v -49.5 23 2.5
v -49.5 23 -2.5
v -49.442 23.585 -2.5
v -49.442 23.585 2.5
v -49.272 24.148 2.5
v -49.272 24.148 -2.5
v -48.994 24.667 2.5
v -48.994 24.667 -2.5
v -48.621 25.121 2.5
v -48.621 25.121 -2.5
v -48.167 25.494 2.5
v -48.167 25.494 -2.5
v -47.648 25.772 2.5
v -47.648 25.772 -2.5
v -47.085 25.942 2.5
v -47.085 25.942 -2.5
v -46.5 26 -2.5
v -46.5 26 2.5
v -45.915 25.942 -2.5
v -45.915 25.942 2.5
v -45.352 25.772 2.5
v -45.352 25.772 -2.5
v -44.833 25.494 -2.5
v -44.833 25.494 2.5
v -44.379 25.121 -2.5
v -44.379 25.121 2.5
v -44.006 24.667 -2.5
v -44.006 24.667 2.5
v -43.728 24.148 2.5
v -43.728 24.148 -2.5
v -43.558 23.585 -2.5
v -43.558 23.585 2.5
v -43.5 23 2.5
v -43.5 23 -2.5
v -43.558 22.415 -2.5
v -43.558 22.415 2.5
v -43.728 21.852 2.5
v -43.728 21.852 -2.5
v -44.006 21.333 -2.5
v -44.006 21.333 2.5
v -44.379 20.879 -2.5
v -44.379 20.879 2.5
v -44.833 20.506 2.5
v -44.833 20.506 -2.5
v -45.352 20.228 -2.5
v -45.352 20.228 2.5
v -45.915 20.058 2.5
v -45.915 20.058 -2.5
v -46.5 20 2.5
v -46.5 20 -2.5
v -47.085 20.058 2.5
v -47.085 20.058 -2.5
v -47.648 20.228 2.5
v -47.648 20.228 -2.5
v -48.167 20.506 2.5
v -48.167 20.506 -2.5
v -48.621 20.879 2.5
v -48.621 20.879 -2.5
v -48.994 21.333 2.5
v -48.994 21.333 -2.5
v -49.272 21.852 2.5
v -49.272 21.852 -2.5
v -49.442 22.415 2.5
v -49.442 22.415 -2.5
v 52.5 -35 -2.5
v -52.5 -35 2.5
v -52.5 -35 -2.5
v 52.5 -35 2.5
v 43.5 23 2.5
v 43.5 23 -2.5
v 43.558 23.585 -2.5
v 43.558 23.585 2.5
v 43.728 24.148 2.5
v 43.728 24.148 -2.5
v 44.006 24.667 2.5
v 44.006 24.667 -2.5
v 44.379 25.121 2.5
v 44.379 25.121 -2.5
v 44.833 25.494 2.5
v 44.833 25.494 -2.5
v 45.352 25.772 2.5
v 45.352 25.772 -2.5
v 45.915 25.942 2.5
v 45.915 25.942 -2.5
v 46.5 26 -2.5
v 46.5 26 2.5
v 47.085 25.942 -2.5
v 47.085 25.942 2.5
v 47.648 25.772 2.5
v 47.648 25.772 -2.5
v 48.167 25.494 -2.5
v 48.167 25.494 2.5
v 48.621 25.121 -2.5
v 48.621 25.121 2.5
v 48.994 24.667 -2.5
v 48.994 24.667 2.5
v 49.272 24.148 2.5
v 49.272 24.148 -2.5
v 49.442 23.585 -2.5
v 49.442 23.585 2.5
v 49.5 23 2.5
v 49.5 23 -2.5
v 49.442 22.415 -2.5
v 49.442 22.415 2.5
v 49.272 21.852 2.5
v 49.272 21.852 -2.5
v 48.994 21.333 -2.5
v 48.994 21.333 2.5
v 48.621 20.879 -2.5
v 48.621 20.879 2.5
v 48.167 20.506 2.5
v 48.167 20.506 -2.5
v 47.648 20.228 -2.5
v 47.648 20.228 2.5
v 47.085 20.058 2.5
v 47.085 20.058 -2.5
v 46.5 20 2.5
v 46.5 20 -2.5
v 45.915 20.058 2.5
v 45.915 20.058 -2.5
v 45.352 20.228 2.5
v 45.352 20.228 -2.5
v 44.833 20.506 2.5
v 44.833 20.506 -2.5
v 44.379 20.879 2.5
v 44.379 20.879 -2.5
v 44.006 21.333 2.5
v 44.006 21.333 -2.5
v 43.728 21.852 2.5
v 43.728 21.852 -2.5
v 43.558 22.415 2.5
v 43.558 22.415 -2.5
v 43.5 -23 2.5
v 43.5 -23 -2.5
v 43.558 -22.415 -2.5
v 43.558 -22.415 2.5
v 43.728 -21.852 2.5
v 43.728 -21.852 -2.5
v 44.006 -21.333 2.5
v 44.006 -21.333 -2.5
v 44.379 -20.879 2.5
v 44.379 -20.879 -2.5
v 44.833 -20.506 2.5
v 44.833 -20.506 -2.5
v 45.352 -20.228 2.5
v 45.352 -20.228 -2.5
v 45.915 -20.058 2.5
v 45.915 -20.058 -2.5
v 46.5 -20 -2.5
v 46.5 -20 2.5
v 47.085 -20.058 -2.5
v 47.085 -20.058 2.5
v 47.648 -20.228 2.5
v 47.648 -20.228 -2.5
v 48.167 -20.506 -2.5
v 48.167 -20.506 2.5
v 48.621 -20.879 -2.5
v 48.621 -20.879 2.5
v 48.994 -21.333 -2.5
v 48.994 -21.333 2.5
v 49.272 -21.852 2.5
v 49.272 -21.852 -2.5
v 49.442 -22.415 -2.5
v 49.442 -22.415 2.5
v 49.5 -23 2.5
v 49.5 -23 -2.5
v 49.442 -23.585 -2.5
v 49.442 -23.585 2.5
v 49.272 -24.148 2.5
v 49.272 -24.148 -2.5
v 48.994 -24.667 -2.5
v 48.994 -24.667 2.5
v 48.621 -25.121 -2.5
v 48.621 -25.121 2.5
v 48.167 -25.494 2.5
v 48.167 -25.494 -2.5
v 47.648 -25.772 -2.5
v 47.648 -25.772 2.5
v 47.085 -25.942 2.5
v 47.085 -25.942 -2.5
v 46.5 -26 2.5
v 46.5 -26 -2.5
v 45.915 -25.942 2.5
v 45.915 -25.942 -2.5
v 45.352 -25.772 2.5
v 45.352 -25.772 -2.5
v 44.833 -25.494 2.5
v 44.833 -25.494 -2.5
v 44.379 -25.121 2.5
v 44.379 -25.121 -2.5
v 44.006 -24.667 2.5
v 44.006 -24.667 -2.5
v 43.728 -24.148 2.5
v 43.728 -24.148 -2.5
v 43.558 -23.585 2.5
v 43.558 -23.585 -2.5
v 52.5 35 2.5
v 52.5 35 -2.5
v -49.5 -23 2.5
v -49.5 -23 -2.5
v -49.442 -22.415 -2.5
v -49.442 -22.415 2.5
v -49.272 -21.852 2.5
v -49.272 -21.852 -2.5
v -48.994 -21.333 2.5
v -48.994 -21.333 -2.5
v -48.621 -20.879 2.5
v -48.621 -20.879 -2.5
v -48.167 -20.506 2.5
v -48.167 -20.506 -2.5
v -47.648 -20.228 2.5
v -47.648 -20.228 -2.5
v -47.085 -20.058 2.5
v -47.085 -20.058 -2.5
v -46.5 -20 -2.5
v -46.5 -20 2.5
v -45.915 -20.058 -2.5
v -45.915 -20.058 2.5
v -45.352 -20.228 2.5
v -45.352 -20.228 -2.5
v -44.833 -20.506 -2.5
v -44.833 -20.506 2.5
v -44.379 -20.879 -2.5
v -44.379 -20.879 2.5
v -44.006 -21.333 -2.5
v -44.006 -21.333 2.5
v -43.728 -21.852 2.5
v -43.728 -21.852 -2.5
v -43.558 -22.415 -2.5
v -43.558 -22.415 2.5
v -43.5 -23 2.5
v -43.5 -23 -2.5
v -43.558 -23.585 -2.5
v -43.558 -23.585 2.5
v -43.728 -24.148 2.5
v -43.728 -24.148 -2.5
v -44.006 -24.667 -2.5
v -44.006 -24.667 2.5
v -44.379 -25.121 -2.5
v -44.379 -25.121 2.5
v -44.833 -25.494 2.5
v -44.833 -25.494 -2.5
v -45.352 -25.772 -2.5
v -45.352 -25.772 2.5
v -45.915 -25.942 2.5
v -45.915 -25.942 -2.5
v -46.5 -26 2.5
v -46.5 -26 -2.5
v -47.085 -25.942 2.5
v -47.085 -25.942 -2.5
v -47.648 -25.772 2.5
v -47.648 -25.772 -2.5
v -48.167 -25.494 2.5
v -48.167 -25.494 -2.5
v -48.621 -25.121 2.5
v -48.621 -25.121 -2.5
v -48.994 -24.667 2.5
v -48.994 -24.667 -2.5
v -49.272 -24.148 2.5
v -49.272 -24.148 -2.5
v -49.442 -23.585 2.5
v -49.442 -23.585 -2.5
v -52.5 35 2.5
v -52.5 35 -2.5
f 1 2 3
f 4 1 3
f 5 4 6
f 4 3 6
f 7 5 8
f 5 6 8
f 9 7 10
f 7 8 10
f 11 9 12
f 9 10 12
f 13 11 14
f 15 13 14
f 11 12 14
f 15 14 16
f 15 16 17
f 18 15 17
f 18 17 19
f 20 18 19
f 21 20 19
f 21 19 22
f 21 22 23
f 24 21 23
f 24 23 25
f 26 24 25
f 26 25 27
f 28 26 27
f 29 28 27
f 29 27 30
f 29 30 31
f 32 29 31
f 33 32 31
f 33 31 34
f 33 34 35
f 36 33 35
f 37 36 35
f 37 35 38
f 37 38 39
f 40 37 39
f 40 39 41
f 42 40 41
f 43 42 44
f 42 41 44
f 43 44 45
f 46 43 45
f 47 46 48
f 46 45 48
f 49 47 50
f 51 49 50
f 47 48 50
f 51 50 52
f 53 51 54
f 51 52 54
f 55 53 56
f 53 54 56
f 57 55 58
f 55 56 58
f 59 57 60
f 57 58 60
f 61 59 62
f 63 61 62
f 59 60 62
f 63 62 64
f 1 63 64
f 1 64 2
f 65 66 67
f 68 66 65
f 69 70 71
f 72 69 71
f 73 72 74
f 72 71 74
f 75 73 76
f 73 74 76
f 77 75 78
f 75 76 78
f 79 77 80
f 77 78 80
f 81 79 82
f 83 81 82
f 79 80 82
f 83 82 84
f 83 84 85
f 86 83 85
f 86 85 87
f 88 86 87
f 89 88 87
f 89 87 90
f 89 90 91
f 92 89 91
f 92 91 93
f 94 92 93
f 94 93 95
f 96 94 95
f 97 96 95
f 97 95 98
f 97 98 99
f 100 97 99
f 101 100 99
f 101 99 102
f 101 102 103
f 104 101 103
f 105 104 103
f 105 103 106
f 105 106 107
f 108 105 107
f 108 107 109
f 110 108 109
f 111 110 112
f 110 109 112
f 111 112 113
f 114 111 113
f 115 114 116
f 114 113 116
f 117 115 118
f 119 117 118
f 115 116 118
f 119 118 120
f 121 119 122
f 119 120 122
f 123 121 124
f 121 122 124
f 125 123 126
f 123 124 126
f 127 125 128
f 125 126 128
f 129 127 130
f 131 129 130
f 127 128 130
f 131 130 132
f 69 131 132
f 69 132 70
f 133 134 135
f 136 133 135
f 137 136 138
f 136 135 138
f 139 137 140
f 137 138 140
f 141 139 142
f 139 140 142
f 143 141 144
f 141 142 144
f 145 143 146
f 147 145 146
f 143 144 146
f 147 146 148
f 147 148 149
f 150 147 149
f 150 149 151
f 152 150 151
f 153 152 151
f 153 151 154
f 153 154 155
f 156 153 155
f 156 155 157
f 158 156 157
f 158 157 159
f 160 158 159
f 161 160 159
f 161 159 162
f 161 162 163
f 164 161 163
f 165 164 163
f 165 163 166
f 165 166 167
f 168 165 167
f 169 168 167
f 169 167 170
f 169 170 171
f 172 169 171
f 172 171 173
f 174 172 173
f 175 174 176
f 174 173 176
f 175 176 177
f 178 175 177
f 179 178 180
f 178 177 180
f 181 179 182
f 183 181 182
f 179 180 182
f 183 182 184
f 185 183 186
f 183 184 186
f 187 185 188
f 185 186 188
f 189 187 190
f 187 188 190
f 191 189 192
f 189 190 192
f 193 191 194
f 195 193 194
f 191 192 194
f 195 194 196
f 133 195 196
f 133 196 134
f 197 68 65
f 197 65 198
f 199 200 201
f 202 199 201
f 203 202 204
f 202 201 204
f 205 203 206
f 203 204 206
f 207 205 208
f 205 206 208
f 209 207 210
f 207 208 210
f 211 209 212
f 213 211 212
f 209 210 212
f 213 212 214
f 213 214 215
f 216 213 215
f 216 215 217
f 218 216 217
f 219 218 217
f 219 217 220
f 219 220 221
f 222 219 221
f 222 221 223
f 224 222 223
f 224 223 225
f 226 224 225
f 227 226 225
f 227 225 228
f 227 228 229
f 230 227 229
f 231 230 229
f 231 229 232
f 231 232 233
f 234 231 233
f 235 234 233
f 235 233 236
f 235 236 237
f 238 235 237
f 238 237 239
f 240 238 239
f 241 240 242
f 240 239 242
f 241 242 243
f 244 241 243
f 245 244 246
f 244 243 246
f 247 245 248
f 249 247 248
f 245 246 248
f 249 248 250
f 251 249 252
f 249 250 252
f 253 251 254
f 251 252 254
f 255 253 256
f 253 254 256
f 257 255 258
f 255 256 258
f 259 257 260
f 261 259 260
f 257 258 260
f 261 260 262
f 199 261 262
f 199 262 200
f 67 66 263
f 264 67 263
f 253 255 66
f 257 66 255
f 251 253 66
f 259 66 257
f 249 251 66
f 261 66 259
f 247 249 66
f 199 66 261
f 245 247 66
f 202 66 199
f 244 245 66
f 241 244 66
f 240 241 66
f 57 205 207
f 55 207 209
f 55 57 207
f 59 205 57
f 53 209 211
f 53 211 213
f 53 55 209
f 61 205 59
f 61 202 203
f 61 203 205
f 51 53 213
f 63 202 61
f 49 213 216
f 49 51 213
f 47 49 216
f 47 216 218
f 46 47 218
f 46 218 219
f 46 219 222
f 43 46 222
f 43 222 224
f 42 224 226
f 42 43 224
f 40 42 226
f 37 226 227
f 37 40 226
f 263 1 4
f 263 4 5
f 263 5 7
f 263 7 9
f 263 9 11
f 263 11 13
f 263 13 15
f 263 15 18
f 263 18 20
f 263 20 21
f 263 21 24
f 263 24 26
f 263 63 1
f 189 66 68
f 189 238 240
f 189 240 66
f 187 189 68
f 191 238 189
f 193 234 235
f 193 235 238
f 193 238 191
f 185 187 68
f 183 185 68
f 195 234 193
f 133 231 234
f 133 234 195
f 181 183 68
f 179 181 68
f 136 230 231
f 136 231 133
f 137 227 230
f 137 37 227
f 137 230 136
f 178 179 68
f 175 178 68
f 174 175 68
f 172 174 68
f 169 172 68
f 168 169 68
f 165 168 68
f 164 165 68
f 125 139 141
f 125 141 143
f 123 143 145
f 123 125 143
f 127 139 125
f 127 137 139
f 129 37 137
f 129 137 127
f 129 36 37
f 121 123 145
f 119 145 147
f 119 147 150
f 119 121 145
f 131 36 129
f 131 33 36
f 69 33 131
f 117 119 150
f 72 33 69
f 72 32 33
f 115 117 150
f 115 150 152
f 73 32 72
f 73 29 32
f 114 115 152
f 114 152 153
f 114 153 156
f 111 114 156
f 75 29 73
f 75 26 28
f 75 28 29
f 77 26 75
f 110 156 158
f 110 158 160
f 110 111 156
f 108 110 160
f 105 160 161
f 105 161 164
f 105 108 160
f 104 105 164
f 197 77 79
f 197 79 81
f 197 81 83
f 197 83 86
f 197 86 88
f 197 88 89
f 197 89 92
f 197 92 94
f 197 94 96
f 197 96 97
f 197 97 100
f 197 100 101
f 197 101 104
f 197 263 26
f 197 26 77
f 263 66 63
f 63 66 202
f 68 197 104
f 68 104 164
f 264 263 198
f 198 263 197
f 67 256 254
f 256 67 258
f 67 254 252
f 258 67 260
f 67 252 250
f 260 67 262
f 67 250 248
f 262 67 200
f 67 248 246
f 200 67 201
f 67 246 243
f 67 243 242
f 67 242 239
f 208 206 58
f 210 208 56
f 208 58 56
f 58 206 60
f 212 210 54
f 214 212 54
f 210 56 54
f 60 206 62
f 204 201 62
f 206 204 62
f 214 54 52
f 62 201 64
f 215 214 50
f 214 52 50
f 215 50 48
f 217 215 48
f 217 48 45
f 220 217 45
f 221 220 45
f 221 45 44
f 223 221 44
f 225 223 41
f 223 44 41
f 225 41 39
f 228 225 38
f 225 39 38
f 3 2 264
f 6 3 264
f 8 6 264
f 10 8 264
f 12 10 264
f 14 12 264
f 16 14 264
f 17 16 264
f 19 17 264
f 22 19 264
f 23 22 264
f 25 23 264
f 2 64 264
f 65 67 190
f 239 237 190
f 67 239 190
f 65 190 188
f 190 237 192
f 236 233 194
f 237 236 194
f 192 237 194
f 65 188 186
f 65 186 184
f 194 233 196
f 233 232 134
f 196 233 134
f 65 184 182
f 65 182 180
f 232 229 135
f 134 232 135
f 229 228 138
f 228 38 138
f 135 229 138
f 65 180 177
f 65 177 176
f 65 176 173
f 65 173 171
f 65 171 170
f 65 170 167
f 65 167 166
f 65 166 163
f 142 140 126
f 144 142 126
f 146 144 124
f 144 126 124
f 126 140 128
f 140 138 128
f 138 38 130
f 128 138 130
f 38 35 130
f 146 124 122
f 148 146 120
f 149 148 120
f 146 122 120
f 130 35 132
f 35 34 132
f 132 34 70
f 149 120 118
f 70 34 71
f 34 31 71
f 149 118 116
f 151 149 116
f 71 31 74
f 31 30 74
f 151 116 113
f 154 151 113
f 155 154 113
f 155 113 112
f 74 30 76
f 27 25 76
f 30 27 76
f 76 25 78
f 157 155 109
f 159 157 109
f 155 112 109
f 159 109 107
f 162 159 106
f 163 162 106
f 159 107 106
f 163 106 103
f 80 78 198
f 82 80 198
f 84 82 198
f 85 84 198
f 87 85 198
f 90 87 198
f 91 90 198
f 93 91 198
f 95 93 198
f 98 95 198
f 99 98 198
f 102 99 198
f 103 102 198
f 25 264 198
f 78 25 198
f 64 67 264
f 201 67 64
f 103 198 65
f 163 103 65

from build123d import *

# Parameters (mm, degrees)
SKETCH1_W             = 105
SKETCH1_H             = 70
BOSS_EXTRUDE1_DEPTH   = 2.5
F_6_0MM_DOWEL_HOLE1_D = 6


with BuildPart() as part:
    # Sketch1 → Boss-Extrude1 (new body, symmetric)
    with BuildSketch(Plane.XY):
        Rectangle(SKETCH1_W, SKETCH1_H)
    extrude(amount=BOSS_EXTRUDE1_DEPTH, both=True)

    # Ø6.0mm Dowel Hole1 (through all)
    with Locations(Plane.XY.offset(2.5)):
        with Locations((-46.5, 23), (-46.5, -23), (46.5, -23), (46.5, 23)):
            Hole(F_6_0MM_DOWEL_HOLE1_D / 2)


solid = part.part
